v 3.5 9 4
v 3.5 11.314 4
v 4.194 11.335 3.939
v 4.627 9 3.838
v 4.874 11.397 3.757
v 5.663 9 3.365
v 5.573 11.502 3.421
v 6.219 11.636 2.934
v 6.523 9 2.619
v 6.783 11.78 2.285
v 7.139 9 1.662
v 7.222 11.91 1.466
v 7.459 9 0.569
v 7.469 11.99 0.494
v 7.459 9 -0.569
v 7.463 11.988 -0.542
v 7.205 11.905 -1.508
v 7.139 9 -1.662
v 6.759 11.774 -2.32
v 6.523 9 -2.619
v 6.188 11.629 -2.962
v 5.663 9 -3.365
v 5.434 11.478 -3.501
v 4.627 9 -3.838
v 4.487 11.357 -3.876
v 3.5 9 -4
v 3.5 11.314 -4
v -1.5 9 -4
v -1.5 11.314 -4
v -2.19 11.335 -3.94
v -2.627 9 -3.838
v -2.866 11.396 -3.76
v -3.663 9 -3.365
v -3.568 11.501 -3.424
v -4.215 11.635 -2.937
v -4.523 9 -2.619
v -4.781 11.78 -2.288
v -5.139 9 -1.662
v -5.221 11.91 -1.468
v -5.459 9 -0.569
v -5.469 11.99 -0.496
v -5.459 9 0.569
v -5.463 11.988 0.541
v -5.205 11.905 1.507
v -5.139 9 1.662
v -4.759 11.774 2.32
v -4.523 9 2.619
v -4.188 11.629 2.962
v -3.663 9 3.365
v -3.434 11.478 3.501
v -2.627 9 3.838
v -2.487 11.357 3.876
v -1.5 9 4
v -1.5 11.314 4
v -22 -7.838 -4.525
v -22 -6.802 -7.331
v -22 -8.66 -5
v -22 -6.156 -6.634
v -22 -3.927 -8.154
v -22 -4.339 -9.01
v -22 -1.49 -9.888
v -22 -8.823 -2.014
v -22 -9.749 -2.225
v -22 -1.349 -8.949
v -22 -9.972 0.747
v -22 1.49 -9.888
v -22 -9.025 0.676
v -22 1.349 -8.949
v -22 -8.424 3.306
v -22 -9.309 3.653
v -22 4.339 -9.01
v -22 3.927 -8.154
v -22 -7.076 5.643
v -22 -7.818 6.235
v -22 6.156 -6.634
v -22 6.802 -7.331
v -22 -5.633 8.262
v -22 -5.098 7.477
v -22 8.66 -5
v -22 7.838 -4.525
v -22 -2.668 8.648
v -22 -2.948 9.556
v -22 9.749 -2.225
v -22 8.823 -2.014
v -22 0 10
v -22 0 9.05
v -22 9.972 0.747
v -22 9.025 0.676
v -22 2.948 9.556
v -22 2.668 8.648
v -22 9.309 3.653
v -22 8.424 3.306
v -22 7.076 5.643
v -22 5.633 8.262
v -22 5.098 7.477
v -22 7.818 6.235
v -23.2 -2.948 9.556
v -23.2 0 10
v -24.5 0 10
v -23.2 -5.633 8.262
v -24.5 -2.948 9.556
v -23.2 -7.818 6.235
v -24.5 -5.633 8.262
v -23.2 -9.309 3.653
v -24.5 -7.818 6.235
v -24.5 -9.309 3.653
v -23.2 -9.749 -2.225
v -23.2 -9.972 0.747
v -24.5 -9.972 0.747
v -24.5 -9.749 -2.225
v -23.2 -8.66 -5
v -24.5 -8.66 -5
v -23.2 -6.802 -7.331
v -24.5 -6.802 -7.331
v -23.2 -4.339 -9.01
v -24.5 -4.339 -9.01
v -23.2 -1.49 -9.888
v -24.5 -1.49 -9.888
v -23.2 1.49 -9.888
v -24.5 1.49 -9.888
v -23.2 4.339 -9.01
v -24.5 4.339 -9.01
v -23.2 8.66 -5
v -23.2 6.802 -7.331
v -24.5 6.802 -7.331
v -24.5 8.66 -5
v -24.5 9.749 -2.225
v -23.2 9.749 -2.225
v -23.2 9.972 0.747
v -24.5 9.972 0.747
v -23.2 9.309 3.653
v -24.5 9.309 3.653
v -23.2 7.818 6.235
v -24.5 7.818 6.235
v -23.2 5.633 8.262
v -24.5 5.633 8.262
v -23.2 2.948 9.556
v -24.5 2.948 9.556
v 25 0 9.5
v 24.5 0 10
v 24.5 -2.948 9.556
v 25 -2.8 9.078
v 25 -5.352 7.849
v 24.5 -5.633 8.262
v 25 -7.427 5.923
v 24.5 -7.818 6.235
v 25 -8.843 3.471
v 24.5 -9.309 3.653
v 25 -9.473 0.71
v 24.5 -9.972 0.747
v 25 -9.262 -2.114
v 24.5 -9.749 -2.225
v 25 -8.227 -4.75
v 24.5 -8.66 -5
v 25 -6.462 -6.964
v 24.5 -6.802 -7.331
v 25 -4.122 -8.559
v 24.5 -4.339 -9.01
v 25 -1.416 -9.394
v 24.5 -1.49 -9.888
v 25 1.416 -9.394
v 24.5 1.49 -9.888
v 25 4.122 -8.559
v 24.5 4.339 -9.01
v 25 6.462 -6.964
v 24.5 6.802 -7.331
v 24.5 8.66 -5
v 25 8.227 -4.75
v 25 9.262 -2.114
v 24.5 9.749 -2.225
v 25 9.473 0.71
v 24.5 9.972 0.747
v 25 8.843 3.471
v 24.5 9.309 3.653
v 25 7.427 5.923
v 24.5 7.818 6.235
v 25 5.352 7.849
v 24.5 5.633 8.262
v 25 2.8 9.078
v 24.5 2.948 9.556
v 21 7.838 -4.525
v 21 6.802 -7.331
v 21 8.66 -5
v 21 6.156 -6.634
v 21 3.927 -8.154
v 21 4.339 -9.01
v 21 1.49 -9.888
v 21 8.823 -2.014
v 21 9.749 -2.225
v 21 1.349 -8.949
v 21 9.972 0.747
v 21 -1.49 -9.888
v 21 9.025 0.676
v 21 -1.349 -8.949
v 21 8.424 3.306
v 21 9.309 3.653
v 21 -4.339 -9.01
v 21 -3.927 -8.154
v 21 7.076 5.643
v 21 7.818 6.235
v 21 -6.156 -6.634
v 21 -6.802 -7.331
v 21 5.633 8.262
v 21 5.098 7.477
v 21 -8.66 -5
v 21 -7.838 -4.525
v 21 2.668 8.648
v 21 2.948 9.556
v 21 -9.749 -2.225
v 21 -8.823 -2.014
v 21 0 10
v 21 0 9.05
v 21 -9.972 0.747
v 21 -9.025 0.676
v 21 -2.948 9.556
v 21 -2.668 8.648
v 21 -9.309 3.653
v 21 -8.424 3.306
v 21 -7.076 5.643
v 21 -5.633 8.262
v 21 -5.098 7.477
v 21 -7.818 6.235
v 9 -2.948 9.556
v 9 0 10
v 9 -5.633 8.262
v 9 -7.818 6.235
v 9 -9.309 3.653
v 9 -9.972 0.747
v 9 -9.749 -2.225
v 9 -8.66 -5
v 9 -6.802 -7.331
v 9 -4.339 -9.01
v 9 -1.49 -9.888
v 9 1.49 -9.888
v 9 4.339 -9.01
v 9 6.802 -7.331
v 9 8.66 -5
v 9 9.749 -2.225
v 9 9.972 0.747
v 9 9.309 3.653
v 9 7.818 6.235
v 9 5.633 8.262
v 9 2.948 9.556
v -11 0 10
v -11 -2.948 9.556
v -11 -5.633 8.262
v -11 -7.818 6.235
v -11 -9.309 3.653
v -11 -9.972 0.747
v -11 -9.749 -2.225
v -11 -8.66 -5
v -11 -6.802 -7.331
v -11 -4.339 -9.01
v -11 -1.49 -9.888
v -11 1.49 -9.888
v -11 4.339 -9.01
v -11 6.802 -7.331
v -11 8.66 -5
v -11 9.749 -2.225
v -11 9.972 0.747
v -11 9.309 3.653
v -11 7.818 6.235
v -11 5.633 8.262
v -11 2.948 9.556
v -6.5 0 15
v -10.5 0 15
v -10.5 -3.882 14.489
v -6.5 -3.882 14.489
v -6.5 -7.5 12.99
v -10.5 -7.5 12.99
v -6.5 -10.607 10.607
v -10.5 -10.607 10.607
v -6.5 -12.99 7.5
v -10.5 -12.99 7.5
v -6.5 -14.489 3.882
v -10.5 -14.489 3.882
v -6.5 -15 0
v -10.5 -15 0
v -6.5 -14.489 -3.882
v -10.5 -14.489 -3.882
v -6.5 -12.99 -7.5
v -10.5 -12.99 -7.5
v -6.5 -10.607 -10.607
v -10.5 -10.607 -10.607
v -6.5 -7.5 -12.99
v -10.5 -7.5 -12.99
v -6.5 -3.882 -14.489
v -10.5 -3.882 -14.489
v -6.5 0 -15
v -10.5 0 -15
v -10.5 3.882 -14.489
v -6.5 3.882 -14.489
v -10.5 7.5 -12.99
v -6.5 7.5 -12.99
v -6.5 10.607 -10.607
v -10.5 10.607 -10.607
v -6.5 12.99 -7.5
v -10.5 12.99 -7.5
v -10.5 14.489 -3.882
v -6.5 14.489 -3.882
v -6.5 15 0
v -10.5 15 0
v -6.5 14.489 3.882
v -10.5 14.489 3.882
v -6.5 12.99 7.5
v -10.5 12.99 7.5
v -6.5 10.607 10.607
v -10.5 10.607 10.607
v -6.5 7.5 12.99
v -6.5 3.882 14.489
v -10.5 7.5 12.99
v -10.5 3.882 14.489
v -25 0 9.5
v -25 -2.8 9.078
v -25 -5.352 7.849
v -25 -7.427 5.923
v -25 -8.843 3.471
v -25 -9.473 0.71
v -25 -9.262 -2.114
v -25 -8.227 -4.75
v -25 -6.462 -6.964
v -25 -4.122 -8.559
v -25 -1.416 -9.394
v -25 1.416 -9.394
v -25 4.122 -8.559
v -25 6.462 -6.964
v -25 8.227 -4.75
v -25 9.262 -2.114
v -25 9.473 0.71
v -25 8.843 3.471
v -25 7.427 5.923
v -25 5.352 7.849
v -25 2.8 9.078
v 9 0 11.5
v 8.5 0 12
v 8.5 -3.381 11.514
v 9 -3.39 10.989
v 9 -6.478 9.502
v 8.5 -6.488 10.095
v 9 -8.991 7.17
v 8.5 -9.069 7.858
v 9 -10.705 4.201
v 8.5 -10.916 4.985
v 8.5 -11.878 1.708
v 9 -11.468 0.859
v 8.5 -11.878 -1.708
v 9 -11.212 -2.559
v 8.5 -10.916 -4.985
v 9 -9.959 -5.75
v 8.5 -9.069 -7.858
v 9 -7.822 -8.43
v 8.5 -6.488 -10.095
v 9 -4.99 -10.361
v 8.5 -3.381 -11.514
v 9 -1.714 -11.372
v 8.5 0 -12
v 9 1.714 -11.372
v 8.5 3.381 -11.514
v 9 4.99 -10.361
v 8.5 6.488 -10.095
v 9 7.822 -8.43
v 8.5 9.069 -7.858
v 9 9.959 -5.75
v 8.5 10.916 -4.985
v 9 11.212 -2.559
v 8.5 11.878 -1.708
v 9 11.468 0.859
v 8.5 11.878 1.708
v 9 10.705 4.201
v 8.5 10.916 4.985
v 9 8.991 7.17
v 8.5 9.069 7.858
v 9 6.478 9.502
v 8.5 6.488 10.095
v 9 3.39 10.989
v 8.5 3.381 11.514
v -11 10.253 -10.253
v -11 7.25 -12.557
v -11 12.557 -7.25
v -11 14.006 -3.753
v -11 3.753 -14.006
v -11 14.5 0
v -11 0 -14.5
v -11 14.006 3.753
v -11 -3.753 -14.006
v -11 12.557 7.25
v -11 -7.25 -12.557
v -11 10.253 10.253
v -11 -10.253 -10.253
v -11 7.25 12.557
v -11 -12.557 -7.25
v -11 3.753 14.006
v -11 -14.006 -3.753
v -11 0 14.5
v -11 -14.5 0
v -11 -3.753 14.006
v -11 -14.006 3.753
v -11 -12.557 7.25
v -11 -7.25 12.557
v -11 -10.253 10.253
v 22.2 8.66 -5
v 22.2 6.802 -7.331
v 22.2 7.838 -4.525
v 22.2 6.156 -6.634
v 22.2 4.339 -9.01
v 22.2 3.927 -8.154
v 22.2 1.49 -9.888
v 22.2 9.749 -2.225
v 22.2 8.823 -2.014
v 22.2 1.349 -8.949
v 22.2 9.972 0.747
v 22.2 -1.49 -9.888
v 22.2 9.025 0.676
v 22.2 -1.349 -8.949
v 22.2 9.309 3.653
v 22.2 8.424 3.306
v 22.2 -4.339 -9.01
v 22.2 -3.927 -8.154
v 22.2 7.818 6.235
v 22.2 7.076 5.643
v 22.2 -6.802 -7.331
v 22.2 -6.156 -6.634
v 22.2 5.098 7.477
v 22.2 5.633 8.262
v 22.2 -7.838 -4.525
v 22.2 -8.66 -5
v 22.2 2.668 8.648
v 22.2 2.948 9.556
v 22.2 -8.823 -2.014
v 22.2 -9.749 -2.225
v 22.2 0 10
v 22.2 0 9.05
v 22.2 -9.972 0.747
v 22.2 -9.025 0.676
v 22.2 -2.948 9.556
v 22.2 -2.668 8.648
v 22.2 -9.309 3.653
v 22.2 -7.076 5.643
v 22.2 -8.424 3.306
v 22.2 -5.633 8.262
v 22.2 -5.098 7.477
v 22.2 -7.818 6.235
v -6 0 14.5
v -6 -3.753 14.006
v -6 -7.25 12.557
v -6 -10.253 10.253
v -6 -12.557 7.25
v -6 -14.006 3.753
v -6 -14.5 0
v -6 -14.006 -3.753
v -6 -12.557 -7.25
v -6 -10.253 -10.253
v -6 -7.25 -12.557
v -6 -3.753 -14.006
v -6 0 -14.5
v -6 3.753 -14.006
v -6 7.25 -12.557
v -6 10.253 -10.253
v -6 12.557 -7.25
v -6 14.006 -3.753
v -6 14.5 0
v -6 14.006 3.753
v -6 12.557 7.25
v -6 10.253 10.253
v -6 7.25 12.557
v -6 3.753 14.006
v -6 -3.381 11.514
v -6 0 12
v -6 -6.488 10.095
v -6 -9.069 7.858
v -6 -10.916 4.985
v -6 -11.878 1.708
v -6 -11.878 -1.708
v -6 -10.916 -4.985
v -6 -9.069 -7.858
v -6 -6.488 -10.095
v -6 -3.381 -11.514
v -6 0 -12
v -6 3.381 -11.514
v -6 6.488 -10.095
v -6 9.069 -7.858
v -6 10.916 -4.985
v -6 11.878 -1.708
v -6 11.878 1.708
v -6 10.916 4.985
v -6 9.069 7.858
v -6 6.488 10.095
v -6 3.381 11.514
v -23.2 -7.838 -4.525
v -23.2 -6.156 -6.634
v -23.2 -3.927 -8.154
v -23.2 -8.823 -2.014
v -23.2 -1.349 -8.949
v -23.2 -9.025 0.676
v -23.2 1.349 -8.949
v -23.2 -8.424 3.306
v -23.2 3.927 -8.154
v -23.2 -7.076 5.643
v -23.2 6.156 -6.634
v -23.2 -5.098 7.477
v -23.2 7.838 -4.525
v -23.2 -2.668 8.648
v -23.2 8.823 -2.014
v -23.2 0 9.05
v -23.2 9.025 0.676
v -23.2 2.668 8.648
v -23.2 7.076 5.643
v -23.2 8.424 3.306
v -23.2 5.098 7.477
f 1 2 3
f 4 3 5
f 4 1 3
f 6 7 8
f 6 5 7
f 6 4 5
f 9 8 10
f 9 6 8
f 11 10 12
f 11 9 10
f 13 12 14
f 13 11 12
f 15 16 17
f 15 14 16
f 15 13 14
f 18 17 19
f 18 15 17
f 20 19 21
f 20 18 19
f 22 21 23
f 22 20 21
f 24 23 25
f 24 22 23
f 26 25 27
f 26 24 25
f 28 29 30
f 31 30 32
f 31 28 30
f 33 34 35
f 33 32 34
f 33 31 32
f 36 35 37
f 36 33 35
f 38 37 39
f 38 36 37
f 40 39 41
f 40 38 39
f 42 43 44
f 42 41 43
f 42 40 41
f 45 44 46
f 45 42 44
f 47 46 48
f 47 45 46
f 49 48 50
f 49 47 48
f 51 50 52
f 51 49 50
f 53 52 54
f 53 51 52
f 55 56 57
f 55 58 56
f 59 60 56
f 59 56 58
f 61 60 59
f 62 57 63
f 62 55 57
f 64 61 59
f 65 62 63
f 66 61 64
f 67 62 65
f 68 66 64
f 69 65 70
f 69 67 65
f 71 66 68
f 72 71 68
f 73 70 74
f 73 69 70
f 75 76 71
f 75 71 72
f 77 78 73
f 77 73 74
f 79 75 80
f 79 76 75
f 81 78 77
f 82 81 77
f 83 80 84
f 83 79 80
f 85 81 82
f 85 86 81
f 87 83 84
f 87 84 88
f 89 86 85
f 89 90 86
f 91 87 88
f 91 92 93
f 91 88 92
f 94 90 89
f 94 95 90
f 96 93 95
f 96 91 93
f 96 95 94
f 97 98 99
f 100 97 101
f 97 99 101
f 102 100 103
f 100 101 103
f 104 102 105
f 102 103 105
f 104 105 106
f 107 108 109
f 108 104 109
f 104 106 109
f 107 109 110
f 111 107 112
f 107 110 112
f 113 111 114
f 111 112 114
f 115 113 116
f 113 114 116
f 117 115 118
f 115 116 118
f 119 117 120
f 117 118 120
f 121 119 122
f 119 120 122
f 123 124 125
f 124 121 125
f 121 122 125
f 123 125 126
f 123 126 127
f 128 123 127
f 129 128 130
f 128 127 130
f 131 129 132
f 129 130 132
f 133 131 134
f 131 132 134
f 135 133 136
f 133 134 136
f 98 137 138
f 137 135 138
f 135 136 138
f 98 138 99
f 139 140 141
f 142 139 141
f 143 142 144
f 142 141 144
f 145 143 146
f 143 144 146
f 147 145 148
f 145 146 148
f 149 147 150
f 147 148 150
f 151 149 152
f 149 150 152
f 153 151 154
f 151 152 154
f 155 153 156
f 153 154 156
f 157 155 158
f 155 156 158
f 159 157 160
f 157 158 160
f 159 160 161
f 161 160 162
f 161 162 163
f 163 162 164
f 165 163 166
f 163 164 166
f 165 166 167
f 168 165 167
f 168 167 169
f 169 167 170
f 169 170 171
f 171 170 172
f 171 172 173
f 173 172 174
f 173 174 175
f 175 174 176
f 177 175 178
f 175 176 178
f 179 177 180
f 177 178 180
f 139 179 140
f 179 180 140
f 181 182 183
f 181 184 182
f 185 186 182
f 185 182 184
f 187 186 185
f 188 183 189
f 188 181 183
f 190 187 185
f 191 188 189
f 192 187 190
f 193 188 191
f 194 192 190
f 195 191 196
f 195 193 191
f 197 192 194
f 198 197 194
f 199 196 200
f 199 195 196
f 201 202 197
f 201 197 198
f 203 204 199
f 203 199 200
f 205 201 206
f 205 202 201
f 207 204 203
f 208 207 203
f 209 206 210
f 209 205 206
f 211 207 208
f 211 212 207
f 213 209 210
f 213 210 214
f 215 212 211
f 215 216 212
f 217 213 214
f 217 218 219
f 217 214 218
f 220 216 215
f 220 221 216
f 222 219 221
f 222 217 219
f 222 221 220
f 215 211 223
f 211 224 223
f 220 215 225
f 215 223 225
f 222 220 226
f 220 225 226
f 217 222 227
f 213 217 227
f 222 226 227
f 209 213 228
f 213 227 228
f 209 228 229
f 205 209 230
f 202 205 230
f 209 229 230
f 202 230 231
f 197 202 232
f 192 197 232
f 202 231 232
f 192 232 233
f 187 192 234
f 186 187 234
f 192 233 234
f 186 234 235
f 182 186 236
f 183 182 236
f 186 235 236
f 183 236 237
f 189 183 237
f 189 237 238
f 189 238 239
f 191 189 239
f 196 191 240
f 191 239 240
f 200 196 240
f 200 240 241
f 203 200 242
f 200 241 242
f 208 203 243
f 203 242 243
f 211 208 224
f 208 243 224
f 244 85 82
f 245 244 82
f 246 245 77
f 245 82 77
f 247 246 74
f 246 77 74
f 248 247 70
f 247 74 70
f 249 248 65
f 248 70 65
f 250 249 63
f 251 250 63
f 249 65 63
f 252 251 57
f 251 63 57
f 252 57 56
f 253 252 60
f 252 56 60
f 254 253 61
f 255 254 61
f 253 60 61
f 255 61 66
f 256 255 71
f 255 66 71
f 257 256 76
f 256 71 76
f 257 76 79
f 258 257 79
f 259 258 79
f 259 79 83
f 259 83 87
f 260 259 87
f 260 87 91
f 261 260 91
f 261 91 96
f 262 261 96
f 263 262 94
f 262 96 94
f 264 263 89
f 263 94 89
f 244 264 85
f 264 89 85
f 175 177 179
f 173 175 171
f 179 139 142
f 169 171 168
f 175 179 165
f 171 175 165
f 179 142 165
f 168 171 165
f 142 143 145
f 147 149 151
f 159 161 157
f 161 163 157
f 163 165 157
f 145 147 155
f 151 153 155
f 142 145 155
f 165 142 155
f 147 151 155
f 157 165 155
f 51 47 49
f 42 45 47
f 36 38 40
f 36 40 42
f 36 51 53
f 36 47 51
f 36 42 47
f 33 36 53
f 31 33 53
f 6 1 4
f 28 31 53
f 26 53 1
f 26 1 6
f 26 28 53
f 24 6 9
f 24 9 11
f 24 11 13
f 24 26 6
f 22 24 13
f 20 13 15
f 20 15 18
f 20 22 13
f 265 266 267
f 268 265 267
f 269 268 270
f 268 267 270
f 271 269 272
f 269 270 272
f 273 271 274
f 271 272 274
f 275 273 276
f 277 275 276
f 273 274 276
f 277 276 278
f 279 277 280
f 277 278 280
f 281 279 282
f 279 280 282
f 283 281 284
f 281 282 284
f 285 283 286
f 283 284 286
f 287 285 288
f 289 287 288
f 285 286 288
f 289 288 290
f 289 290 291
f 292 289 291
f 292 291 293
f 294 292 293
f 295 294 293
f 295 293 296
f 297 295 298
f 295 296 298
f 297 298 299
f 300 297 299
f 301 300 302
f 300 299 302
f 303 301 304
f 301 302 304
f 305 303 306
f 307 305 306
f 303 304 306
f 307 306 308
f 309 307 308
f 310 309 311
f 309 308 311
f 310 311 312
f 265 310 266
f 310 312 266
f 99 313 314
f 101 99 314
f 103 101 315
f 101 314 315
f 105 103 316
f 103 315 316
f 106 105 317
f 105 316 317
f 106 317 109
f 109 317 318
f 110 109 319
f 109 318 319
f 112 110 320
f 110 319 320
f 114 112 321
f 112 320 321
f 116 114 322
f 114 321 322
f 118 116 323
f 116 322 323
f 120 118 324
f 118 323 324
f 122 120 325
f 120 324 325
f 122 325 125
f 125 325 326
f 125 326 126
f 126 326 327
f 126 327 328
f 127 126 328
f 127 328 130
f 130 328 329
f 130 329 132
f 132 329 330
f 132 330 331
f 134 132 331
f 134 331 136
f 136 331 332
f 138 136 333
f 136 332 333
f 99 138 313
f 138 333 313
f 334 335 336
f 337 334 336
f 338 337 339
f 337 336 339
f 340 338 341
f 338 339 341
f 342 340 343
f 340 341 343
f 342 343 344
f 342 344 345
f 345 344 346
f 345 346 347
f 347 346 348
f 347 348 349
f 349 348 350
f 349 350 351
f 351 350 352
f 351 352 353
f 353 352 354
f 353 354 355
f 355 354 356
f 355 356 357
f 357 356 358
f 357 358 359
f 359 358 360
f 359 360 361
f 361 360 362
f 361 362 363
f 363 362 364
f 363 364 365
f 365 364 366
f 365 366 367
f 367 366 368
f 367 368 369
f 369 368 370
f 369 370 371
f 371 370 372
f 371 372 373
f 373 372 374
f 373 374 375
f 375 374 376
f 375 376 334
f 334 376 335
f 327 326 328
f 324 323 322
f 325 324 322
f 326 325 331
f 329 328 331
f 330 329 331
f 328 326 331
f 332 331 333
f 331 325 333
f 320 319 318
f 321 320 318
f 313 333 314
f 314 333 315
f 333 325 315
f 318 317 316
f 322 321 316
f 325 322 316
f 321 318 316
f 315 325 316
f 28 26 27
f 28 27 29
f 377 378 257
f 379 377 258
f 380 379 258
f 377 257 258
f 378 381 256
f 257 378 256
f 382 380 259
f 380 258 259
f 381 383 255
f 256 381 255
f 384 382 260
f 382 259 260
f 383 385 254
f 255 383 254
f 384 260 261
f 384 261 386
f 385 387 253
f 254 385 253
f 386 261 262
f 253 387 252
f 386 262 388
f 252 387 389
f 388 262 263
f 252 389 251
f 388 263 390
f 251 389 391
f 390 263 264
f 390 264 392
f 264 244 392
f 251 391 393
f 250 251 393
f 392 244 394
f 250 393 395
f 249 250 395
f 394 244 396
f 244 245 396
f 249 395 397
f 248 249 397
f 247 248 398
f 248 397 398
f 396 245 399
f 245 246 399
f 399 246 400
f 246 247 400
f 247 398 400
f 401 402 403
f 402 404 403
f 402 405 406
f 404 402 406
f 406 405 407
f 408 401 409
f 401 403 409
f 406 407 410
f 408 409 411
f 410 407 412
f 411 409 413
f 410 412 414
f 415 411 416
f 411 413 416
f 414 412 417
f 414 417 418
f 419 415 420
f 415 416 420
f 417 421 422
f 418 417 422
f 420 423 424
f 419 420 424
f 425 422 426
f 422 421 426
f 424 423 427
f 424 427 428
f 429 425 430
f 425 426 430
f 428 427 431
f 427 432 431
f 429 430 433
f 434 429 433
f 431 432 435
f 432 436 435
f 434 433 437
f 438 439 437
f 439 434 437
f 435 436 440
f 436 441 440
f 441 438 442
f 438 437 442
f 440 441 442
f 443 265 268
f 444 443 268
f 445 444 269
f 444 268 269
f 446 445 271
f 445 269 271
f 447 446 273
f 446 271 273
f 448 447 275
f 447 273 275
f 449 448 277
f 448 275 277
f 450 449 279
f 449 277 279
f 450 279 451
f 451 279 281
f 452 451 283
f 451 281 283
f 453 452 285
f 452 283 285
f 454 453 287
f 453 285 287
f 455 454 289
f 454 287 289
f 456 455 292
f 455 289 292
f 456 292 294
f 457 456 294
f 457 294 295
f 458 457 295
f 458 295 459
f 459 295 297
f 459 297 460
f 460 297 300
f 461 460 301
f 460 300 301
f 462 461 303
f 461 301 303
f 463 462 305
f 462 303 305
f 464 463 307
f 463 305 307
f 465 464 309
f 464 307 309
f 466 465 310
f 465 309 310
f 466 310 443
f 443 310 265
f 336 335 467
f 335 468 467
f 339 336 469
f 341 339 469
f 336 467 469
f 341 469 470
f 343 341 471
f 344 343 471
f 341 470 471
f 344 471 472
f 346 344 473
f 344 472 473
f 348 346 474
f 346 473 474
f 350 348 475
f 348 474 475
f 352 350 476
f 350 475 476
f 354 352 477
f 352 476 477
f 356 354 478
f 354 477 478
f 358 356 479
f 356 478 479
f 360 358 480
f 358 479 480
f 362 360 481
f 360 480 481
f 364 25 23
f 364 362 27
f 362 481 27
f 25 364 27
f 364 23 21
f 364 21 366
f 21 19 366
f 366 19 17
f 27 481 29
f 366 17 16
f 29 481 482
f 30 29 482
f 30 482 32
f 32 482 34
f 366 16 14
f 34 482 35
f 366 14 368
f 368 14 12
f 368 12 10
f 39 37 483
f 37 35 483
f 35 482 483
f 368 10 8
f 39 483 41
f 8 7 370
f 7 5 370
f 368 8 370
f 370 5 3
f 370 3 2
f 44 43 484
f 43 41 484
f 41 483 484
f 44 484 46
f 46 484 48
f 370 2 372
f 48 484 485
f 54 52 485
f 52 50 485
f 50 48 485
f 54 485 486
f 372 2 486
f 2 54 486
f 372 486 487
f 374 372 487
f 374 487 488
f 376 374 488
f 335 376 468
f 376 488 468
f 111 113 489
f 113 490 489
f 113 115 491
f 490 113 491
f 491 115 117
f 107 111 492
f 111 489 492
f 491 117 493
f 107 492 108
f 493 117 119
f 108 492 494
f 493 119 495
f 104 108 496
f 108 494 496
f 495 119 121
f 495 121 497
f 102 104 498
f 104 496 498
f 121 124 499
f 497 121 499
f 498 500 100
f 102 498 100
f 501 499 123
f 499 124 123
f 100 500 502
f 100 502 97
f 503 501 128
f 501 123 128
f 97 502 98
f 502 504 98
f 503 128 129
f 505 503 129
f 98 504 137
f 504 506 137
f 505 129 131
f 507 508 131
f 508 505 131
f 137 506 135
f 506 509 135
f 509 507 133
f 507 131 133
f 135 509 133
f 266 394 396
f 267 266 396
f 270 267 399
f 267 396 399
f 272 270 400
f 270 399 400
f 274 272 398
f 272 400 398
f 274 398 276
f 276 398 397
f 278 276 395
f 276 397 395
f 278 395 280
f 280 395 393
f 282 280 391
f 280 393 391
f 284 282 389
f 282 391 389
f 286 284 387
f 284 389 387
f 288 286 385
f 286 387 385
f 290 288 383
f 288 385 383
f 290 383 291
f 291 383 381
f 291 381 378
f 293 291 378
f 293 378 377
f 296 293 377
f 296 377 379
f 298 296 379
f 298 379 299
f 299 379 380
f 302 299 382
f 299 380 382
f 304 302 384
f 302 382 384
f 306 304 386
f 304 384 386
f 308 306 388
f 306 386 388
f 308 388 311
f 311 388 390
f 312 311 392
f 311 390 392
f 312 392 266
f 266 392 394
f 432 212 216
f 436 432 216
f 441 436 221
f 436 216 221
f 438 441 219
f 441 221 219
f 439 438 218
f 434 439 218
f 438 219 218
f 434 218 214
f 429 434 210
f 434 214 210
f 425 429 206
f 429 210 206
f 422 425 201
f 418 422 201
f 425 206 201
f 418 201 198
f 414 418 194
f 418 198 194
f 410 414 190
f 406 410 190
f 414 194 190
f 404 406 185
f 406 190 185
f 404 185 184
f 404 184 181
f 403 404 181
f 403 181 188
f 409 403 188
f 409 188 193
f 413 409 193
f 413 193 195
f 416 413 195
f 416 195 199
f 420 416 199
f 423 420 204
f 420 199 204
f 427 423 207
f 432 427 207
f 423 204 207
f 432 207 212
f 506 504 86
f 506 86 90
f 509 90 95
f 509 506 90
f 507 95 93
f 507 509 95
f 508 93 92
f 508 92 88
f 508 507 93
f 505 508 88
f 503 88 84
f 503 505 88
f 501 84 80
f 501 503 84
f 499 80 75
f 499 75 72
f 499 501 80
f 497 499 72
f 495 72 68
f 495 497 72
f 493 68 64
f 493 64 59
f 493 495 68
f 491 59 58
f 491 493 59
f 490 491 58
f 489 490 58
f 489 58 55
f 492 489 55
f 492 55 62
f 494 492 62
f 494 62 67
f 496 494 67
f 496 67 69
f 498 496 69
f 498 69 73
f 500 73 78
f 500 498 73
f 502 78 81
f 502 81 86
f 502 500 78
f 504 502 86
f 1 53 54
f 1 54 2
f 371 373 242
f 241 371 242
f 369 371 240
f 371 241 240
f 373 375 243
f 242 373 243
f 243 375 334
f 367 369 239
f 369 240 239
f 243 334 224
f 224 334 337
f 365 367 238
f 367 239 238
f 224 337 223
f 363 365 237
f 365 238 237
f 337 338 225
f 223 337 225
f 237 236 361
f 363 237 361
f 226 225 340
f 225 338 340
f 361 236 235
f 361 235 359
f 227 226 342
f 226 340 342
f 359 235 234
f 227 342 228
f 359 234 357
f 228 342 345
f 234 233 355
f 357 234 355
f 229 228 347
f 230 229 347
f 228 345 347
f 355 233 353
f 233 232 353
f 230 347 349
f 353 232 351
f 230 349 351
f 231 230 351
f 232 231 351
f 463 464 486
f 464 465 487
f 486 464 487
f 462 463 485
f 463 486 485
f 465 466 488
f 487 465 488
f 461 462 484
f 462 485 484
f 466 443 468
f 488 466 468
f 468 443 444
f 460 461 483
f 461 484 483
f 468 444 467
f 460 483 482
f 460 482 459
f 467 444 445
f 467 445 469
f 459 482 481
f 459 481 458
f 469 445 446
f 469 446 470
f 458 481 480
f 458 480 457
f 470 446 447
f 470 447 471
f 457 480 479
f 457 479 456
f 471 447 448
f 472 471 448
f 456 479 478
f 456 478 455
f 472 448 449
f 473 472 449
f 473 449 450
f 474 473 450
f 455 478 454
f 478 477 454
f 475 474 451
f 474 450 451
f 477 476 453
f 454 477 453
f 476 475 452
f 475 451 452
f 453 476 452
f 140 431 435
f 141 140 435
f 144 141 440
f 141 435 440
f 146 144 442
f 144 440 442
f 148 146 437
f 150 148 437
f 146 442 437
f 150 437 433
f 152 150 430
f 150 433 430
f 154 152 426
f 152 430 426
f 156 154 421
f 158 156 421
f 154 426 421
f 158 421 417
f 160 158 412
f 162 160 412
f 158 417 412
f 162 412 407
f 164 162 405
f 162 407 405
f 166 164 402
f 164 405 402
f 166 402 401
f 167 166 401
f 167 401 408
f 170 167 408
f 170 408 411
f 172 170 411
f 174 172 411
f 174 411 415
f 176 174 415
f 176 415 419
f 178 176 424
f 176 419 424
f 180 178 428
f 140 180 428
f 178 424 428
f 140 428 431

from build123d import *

# Parameters (mm, degrees)
SCHIZZO2_R               = 10
SCHIZZO2_R_2             = 9.05
TAGLIO_ESTRUSIONE1_DEPTH = 1.2
TAGLIO_ESTRUSIONE2_START = -1.2
SCHIZZO3_R               = 10
SCHIZZO3_R_2             = 9.05
TAGLIO_ESTRUSIONE2_DEPTH = 1.2
SMUSSO1_SIZE             = 0.5
TAGLIO_ESTRUSIONE5_START = 9
TAGLIO_ESTRUSIONE5_DEPTH = 3.0000001


with BuildPart() as part:
    # Schizzo1 → Rivoluzione1 (revolve)
    with BuildSketch(Plane.XY, mode=Mode.PRIVATE) as rivoluzione1_sk:
        Polygon((-25, 0), (25, 0), (25, -10), (9, -10), (9, -12), (-6, -12), (-6, -15), (-11, -15), (-11, -10), (-25, -10), align=None)
    revolve(rivoluzione1_sk.sketch.rotate(Axis((-25, 0, 0), (1, 0, 0)), 270), axis=Axis((-25, 0, 0), (1, 0, 0)))

    # Schizzo2 → Taglio-Estrusione1 (cut)
    with BuildSketch(Plane.ZY.offset(23.2)):
        Circle(SCHIZZO2_R)
        Circle(SCHIZZO2_R_2, mode=Mode.SUBTRACT)
    extrude(amount=-TAGLIO_ESTRUSIONE1_DEPTH, mode=Mode.SUBTRACT)

    # Schizzo3 → Taglio-Estrusione2 (cut)
    with BuildSketch(Plane(origin=(22.2, 0, 0), x_dir=(0, 0, -1), z_dir=(1, 0, 0)).offset(TAGLIO_ESTRUSIONE2_START)):
        with Locations(Location((0, 0, 0), (0, 0, 180))):
            Circle(SCHIZZO3_R)
        with Locations(Location((0, 0, 0), (0, 0, 180))):
            Circle(SCHIZZO3_R_2, mode=Mode.SUBTRACT)
    extrude(amount=TAGLIO_ESTRUSIONE2_DEPTH, mode=Mode.SUBTRACT)

    # Smusso1
    smusso1_edges = [part.edges().sort_by_distance(p)[0] for p in [
        (-6, 0, -15),
        (-11, 0, -15),
        (-25, 0, -10),
        (25, 0, -10),
        (9, 0, -12),
    ]]
    chamfer(smusso1_edges, length=SMUSSO1_SIZE)

    # Taglio-Estrusione5: read off the stored shape, not the designer's step
    # Taglio-Estrusione5 outline → Taglio-Estrusione5 (cut)
    with BuildSketch(Plane(origin=(0, 0, 0), x_dir=(1, 0, 0), z_dir=(0, 1, 0)).offset(TAGLIO_ESTRUSIONE5_START)):
        with BuildLine():
            Line((3.5, 4), (-1.5, 4))
            ThreePointArc((-1.5, 4), (-5.5, 0), (-1.5, -4))
            Line((-1.5, -4), (3.5, -4))
            ThreePointArc((3.5, -4), (7.5, 0), (3.5, 4))
        make_face()
    extrude(amount=TAGLIO_ESTRUSIONE5_DEPTH, mode=Mode.SUBTRACT)


solid = part.part
